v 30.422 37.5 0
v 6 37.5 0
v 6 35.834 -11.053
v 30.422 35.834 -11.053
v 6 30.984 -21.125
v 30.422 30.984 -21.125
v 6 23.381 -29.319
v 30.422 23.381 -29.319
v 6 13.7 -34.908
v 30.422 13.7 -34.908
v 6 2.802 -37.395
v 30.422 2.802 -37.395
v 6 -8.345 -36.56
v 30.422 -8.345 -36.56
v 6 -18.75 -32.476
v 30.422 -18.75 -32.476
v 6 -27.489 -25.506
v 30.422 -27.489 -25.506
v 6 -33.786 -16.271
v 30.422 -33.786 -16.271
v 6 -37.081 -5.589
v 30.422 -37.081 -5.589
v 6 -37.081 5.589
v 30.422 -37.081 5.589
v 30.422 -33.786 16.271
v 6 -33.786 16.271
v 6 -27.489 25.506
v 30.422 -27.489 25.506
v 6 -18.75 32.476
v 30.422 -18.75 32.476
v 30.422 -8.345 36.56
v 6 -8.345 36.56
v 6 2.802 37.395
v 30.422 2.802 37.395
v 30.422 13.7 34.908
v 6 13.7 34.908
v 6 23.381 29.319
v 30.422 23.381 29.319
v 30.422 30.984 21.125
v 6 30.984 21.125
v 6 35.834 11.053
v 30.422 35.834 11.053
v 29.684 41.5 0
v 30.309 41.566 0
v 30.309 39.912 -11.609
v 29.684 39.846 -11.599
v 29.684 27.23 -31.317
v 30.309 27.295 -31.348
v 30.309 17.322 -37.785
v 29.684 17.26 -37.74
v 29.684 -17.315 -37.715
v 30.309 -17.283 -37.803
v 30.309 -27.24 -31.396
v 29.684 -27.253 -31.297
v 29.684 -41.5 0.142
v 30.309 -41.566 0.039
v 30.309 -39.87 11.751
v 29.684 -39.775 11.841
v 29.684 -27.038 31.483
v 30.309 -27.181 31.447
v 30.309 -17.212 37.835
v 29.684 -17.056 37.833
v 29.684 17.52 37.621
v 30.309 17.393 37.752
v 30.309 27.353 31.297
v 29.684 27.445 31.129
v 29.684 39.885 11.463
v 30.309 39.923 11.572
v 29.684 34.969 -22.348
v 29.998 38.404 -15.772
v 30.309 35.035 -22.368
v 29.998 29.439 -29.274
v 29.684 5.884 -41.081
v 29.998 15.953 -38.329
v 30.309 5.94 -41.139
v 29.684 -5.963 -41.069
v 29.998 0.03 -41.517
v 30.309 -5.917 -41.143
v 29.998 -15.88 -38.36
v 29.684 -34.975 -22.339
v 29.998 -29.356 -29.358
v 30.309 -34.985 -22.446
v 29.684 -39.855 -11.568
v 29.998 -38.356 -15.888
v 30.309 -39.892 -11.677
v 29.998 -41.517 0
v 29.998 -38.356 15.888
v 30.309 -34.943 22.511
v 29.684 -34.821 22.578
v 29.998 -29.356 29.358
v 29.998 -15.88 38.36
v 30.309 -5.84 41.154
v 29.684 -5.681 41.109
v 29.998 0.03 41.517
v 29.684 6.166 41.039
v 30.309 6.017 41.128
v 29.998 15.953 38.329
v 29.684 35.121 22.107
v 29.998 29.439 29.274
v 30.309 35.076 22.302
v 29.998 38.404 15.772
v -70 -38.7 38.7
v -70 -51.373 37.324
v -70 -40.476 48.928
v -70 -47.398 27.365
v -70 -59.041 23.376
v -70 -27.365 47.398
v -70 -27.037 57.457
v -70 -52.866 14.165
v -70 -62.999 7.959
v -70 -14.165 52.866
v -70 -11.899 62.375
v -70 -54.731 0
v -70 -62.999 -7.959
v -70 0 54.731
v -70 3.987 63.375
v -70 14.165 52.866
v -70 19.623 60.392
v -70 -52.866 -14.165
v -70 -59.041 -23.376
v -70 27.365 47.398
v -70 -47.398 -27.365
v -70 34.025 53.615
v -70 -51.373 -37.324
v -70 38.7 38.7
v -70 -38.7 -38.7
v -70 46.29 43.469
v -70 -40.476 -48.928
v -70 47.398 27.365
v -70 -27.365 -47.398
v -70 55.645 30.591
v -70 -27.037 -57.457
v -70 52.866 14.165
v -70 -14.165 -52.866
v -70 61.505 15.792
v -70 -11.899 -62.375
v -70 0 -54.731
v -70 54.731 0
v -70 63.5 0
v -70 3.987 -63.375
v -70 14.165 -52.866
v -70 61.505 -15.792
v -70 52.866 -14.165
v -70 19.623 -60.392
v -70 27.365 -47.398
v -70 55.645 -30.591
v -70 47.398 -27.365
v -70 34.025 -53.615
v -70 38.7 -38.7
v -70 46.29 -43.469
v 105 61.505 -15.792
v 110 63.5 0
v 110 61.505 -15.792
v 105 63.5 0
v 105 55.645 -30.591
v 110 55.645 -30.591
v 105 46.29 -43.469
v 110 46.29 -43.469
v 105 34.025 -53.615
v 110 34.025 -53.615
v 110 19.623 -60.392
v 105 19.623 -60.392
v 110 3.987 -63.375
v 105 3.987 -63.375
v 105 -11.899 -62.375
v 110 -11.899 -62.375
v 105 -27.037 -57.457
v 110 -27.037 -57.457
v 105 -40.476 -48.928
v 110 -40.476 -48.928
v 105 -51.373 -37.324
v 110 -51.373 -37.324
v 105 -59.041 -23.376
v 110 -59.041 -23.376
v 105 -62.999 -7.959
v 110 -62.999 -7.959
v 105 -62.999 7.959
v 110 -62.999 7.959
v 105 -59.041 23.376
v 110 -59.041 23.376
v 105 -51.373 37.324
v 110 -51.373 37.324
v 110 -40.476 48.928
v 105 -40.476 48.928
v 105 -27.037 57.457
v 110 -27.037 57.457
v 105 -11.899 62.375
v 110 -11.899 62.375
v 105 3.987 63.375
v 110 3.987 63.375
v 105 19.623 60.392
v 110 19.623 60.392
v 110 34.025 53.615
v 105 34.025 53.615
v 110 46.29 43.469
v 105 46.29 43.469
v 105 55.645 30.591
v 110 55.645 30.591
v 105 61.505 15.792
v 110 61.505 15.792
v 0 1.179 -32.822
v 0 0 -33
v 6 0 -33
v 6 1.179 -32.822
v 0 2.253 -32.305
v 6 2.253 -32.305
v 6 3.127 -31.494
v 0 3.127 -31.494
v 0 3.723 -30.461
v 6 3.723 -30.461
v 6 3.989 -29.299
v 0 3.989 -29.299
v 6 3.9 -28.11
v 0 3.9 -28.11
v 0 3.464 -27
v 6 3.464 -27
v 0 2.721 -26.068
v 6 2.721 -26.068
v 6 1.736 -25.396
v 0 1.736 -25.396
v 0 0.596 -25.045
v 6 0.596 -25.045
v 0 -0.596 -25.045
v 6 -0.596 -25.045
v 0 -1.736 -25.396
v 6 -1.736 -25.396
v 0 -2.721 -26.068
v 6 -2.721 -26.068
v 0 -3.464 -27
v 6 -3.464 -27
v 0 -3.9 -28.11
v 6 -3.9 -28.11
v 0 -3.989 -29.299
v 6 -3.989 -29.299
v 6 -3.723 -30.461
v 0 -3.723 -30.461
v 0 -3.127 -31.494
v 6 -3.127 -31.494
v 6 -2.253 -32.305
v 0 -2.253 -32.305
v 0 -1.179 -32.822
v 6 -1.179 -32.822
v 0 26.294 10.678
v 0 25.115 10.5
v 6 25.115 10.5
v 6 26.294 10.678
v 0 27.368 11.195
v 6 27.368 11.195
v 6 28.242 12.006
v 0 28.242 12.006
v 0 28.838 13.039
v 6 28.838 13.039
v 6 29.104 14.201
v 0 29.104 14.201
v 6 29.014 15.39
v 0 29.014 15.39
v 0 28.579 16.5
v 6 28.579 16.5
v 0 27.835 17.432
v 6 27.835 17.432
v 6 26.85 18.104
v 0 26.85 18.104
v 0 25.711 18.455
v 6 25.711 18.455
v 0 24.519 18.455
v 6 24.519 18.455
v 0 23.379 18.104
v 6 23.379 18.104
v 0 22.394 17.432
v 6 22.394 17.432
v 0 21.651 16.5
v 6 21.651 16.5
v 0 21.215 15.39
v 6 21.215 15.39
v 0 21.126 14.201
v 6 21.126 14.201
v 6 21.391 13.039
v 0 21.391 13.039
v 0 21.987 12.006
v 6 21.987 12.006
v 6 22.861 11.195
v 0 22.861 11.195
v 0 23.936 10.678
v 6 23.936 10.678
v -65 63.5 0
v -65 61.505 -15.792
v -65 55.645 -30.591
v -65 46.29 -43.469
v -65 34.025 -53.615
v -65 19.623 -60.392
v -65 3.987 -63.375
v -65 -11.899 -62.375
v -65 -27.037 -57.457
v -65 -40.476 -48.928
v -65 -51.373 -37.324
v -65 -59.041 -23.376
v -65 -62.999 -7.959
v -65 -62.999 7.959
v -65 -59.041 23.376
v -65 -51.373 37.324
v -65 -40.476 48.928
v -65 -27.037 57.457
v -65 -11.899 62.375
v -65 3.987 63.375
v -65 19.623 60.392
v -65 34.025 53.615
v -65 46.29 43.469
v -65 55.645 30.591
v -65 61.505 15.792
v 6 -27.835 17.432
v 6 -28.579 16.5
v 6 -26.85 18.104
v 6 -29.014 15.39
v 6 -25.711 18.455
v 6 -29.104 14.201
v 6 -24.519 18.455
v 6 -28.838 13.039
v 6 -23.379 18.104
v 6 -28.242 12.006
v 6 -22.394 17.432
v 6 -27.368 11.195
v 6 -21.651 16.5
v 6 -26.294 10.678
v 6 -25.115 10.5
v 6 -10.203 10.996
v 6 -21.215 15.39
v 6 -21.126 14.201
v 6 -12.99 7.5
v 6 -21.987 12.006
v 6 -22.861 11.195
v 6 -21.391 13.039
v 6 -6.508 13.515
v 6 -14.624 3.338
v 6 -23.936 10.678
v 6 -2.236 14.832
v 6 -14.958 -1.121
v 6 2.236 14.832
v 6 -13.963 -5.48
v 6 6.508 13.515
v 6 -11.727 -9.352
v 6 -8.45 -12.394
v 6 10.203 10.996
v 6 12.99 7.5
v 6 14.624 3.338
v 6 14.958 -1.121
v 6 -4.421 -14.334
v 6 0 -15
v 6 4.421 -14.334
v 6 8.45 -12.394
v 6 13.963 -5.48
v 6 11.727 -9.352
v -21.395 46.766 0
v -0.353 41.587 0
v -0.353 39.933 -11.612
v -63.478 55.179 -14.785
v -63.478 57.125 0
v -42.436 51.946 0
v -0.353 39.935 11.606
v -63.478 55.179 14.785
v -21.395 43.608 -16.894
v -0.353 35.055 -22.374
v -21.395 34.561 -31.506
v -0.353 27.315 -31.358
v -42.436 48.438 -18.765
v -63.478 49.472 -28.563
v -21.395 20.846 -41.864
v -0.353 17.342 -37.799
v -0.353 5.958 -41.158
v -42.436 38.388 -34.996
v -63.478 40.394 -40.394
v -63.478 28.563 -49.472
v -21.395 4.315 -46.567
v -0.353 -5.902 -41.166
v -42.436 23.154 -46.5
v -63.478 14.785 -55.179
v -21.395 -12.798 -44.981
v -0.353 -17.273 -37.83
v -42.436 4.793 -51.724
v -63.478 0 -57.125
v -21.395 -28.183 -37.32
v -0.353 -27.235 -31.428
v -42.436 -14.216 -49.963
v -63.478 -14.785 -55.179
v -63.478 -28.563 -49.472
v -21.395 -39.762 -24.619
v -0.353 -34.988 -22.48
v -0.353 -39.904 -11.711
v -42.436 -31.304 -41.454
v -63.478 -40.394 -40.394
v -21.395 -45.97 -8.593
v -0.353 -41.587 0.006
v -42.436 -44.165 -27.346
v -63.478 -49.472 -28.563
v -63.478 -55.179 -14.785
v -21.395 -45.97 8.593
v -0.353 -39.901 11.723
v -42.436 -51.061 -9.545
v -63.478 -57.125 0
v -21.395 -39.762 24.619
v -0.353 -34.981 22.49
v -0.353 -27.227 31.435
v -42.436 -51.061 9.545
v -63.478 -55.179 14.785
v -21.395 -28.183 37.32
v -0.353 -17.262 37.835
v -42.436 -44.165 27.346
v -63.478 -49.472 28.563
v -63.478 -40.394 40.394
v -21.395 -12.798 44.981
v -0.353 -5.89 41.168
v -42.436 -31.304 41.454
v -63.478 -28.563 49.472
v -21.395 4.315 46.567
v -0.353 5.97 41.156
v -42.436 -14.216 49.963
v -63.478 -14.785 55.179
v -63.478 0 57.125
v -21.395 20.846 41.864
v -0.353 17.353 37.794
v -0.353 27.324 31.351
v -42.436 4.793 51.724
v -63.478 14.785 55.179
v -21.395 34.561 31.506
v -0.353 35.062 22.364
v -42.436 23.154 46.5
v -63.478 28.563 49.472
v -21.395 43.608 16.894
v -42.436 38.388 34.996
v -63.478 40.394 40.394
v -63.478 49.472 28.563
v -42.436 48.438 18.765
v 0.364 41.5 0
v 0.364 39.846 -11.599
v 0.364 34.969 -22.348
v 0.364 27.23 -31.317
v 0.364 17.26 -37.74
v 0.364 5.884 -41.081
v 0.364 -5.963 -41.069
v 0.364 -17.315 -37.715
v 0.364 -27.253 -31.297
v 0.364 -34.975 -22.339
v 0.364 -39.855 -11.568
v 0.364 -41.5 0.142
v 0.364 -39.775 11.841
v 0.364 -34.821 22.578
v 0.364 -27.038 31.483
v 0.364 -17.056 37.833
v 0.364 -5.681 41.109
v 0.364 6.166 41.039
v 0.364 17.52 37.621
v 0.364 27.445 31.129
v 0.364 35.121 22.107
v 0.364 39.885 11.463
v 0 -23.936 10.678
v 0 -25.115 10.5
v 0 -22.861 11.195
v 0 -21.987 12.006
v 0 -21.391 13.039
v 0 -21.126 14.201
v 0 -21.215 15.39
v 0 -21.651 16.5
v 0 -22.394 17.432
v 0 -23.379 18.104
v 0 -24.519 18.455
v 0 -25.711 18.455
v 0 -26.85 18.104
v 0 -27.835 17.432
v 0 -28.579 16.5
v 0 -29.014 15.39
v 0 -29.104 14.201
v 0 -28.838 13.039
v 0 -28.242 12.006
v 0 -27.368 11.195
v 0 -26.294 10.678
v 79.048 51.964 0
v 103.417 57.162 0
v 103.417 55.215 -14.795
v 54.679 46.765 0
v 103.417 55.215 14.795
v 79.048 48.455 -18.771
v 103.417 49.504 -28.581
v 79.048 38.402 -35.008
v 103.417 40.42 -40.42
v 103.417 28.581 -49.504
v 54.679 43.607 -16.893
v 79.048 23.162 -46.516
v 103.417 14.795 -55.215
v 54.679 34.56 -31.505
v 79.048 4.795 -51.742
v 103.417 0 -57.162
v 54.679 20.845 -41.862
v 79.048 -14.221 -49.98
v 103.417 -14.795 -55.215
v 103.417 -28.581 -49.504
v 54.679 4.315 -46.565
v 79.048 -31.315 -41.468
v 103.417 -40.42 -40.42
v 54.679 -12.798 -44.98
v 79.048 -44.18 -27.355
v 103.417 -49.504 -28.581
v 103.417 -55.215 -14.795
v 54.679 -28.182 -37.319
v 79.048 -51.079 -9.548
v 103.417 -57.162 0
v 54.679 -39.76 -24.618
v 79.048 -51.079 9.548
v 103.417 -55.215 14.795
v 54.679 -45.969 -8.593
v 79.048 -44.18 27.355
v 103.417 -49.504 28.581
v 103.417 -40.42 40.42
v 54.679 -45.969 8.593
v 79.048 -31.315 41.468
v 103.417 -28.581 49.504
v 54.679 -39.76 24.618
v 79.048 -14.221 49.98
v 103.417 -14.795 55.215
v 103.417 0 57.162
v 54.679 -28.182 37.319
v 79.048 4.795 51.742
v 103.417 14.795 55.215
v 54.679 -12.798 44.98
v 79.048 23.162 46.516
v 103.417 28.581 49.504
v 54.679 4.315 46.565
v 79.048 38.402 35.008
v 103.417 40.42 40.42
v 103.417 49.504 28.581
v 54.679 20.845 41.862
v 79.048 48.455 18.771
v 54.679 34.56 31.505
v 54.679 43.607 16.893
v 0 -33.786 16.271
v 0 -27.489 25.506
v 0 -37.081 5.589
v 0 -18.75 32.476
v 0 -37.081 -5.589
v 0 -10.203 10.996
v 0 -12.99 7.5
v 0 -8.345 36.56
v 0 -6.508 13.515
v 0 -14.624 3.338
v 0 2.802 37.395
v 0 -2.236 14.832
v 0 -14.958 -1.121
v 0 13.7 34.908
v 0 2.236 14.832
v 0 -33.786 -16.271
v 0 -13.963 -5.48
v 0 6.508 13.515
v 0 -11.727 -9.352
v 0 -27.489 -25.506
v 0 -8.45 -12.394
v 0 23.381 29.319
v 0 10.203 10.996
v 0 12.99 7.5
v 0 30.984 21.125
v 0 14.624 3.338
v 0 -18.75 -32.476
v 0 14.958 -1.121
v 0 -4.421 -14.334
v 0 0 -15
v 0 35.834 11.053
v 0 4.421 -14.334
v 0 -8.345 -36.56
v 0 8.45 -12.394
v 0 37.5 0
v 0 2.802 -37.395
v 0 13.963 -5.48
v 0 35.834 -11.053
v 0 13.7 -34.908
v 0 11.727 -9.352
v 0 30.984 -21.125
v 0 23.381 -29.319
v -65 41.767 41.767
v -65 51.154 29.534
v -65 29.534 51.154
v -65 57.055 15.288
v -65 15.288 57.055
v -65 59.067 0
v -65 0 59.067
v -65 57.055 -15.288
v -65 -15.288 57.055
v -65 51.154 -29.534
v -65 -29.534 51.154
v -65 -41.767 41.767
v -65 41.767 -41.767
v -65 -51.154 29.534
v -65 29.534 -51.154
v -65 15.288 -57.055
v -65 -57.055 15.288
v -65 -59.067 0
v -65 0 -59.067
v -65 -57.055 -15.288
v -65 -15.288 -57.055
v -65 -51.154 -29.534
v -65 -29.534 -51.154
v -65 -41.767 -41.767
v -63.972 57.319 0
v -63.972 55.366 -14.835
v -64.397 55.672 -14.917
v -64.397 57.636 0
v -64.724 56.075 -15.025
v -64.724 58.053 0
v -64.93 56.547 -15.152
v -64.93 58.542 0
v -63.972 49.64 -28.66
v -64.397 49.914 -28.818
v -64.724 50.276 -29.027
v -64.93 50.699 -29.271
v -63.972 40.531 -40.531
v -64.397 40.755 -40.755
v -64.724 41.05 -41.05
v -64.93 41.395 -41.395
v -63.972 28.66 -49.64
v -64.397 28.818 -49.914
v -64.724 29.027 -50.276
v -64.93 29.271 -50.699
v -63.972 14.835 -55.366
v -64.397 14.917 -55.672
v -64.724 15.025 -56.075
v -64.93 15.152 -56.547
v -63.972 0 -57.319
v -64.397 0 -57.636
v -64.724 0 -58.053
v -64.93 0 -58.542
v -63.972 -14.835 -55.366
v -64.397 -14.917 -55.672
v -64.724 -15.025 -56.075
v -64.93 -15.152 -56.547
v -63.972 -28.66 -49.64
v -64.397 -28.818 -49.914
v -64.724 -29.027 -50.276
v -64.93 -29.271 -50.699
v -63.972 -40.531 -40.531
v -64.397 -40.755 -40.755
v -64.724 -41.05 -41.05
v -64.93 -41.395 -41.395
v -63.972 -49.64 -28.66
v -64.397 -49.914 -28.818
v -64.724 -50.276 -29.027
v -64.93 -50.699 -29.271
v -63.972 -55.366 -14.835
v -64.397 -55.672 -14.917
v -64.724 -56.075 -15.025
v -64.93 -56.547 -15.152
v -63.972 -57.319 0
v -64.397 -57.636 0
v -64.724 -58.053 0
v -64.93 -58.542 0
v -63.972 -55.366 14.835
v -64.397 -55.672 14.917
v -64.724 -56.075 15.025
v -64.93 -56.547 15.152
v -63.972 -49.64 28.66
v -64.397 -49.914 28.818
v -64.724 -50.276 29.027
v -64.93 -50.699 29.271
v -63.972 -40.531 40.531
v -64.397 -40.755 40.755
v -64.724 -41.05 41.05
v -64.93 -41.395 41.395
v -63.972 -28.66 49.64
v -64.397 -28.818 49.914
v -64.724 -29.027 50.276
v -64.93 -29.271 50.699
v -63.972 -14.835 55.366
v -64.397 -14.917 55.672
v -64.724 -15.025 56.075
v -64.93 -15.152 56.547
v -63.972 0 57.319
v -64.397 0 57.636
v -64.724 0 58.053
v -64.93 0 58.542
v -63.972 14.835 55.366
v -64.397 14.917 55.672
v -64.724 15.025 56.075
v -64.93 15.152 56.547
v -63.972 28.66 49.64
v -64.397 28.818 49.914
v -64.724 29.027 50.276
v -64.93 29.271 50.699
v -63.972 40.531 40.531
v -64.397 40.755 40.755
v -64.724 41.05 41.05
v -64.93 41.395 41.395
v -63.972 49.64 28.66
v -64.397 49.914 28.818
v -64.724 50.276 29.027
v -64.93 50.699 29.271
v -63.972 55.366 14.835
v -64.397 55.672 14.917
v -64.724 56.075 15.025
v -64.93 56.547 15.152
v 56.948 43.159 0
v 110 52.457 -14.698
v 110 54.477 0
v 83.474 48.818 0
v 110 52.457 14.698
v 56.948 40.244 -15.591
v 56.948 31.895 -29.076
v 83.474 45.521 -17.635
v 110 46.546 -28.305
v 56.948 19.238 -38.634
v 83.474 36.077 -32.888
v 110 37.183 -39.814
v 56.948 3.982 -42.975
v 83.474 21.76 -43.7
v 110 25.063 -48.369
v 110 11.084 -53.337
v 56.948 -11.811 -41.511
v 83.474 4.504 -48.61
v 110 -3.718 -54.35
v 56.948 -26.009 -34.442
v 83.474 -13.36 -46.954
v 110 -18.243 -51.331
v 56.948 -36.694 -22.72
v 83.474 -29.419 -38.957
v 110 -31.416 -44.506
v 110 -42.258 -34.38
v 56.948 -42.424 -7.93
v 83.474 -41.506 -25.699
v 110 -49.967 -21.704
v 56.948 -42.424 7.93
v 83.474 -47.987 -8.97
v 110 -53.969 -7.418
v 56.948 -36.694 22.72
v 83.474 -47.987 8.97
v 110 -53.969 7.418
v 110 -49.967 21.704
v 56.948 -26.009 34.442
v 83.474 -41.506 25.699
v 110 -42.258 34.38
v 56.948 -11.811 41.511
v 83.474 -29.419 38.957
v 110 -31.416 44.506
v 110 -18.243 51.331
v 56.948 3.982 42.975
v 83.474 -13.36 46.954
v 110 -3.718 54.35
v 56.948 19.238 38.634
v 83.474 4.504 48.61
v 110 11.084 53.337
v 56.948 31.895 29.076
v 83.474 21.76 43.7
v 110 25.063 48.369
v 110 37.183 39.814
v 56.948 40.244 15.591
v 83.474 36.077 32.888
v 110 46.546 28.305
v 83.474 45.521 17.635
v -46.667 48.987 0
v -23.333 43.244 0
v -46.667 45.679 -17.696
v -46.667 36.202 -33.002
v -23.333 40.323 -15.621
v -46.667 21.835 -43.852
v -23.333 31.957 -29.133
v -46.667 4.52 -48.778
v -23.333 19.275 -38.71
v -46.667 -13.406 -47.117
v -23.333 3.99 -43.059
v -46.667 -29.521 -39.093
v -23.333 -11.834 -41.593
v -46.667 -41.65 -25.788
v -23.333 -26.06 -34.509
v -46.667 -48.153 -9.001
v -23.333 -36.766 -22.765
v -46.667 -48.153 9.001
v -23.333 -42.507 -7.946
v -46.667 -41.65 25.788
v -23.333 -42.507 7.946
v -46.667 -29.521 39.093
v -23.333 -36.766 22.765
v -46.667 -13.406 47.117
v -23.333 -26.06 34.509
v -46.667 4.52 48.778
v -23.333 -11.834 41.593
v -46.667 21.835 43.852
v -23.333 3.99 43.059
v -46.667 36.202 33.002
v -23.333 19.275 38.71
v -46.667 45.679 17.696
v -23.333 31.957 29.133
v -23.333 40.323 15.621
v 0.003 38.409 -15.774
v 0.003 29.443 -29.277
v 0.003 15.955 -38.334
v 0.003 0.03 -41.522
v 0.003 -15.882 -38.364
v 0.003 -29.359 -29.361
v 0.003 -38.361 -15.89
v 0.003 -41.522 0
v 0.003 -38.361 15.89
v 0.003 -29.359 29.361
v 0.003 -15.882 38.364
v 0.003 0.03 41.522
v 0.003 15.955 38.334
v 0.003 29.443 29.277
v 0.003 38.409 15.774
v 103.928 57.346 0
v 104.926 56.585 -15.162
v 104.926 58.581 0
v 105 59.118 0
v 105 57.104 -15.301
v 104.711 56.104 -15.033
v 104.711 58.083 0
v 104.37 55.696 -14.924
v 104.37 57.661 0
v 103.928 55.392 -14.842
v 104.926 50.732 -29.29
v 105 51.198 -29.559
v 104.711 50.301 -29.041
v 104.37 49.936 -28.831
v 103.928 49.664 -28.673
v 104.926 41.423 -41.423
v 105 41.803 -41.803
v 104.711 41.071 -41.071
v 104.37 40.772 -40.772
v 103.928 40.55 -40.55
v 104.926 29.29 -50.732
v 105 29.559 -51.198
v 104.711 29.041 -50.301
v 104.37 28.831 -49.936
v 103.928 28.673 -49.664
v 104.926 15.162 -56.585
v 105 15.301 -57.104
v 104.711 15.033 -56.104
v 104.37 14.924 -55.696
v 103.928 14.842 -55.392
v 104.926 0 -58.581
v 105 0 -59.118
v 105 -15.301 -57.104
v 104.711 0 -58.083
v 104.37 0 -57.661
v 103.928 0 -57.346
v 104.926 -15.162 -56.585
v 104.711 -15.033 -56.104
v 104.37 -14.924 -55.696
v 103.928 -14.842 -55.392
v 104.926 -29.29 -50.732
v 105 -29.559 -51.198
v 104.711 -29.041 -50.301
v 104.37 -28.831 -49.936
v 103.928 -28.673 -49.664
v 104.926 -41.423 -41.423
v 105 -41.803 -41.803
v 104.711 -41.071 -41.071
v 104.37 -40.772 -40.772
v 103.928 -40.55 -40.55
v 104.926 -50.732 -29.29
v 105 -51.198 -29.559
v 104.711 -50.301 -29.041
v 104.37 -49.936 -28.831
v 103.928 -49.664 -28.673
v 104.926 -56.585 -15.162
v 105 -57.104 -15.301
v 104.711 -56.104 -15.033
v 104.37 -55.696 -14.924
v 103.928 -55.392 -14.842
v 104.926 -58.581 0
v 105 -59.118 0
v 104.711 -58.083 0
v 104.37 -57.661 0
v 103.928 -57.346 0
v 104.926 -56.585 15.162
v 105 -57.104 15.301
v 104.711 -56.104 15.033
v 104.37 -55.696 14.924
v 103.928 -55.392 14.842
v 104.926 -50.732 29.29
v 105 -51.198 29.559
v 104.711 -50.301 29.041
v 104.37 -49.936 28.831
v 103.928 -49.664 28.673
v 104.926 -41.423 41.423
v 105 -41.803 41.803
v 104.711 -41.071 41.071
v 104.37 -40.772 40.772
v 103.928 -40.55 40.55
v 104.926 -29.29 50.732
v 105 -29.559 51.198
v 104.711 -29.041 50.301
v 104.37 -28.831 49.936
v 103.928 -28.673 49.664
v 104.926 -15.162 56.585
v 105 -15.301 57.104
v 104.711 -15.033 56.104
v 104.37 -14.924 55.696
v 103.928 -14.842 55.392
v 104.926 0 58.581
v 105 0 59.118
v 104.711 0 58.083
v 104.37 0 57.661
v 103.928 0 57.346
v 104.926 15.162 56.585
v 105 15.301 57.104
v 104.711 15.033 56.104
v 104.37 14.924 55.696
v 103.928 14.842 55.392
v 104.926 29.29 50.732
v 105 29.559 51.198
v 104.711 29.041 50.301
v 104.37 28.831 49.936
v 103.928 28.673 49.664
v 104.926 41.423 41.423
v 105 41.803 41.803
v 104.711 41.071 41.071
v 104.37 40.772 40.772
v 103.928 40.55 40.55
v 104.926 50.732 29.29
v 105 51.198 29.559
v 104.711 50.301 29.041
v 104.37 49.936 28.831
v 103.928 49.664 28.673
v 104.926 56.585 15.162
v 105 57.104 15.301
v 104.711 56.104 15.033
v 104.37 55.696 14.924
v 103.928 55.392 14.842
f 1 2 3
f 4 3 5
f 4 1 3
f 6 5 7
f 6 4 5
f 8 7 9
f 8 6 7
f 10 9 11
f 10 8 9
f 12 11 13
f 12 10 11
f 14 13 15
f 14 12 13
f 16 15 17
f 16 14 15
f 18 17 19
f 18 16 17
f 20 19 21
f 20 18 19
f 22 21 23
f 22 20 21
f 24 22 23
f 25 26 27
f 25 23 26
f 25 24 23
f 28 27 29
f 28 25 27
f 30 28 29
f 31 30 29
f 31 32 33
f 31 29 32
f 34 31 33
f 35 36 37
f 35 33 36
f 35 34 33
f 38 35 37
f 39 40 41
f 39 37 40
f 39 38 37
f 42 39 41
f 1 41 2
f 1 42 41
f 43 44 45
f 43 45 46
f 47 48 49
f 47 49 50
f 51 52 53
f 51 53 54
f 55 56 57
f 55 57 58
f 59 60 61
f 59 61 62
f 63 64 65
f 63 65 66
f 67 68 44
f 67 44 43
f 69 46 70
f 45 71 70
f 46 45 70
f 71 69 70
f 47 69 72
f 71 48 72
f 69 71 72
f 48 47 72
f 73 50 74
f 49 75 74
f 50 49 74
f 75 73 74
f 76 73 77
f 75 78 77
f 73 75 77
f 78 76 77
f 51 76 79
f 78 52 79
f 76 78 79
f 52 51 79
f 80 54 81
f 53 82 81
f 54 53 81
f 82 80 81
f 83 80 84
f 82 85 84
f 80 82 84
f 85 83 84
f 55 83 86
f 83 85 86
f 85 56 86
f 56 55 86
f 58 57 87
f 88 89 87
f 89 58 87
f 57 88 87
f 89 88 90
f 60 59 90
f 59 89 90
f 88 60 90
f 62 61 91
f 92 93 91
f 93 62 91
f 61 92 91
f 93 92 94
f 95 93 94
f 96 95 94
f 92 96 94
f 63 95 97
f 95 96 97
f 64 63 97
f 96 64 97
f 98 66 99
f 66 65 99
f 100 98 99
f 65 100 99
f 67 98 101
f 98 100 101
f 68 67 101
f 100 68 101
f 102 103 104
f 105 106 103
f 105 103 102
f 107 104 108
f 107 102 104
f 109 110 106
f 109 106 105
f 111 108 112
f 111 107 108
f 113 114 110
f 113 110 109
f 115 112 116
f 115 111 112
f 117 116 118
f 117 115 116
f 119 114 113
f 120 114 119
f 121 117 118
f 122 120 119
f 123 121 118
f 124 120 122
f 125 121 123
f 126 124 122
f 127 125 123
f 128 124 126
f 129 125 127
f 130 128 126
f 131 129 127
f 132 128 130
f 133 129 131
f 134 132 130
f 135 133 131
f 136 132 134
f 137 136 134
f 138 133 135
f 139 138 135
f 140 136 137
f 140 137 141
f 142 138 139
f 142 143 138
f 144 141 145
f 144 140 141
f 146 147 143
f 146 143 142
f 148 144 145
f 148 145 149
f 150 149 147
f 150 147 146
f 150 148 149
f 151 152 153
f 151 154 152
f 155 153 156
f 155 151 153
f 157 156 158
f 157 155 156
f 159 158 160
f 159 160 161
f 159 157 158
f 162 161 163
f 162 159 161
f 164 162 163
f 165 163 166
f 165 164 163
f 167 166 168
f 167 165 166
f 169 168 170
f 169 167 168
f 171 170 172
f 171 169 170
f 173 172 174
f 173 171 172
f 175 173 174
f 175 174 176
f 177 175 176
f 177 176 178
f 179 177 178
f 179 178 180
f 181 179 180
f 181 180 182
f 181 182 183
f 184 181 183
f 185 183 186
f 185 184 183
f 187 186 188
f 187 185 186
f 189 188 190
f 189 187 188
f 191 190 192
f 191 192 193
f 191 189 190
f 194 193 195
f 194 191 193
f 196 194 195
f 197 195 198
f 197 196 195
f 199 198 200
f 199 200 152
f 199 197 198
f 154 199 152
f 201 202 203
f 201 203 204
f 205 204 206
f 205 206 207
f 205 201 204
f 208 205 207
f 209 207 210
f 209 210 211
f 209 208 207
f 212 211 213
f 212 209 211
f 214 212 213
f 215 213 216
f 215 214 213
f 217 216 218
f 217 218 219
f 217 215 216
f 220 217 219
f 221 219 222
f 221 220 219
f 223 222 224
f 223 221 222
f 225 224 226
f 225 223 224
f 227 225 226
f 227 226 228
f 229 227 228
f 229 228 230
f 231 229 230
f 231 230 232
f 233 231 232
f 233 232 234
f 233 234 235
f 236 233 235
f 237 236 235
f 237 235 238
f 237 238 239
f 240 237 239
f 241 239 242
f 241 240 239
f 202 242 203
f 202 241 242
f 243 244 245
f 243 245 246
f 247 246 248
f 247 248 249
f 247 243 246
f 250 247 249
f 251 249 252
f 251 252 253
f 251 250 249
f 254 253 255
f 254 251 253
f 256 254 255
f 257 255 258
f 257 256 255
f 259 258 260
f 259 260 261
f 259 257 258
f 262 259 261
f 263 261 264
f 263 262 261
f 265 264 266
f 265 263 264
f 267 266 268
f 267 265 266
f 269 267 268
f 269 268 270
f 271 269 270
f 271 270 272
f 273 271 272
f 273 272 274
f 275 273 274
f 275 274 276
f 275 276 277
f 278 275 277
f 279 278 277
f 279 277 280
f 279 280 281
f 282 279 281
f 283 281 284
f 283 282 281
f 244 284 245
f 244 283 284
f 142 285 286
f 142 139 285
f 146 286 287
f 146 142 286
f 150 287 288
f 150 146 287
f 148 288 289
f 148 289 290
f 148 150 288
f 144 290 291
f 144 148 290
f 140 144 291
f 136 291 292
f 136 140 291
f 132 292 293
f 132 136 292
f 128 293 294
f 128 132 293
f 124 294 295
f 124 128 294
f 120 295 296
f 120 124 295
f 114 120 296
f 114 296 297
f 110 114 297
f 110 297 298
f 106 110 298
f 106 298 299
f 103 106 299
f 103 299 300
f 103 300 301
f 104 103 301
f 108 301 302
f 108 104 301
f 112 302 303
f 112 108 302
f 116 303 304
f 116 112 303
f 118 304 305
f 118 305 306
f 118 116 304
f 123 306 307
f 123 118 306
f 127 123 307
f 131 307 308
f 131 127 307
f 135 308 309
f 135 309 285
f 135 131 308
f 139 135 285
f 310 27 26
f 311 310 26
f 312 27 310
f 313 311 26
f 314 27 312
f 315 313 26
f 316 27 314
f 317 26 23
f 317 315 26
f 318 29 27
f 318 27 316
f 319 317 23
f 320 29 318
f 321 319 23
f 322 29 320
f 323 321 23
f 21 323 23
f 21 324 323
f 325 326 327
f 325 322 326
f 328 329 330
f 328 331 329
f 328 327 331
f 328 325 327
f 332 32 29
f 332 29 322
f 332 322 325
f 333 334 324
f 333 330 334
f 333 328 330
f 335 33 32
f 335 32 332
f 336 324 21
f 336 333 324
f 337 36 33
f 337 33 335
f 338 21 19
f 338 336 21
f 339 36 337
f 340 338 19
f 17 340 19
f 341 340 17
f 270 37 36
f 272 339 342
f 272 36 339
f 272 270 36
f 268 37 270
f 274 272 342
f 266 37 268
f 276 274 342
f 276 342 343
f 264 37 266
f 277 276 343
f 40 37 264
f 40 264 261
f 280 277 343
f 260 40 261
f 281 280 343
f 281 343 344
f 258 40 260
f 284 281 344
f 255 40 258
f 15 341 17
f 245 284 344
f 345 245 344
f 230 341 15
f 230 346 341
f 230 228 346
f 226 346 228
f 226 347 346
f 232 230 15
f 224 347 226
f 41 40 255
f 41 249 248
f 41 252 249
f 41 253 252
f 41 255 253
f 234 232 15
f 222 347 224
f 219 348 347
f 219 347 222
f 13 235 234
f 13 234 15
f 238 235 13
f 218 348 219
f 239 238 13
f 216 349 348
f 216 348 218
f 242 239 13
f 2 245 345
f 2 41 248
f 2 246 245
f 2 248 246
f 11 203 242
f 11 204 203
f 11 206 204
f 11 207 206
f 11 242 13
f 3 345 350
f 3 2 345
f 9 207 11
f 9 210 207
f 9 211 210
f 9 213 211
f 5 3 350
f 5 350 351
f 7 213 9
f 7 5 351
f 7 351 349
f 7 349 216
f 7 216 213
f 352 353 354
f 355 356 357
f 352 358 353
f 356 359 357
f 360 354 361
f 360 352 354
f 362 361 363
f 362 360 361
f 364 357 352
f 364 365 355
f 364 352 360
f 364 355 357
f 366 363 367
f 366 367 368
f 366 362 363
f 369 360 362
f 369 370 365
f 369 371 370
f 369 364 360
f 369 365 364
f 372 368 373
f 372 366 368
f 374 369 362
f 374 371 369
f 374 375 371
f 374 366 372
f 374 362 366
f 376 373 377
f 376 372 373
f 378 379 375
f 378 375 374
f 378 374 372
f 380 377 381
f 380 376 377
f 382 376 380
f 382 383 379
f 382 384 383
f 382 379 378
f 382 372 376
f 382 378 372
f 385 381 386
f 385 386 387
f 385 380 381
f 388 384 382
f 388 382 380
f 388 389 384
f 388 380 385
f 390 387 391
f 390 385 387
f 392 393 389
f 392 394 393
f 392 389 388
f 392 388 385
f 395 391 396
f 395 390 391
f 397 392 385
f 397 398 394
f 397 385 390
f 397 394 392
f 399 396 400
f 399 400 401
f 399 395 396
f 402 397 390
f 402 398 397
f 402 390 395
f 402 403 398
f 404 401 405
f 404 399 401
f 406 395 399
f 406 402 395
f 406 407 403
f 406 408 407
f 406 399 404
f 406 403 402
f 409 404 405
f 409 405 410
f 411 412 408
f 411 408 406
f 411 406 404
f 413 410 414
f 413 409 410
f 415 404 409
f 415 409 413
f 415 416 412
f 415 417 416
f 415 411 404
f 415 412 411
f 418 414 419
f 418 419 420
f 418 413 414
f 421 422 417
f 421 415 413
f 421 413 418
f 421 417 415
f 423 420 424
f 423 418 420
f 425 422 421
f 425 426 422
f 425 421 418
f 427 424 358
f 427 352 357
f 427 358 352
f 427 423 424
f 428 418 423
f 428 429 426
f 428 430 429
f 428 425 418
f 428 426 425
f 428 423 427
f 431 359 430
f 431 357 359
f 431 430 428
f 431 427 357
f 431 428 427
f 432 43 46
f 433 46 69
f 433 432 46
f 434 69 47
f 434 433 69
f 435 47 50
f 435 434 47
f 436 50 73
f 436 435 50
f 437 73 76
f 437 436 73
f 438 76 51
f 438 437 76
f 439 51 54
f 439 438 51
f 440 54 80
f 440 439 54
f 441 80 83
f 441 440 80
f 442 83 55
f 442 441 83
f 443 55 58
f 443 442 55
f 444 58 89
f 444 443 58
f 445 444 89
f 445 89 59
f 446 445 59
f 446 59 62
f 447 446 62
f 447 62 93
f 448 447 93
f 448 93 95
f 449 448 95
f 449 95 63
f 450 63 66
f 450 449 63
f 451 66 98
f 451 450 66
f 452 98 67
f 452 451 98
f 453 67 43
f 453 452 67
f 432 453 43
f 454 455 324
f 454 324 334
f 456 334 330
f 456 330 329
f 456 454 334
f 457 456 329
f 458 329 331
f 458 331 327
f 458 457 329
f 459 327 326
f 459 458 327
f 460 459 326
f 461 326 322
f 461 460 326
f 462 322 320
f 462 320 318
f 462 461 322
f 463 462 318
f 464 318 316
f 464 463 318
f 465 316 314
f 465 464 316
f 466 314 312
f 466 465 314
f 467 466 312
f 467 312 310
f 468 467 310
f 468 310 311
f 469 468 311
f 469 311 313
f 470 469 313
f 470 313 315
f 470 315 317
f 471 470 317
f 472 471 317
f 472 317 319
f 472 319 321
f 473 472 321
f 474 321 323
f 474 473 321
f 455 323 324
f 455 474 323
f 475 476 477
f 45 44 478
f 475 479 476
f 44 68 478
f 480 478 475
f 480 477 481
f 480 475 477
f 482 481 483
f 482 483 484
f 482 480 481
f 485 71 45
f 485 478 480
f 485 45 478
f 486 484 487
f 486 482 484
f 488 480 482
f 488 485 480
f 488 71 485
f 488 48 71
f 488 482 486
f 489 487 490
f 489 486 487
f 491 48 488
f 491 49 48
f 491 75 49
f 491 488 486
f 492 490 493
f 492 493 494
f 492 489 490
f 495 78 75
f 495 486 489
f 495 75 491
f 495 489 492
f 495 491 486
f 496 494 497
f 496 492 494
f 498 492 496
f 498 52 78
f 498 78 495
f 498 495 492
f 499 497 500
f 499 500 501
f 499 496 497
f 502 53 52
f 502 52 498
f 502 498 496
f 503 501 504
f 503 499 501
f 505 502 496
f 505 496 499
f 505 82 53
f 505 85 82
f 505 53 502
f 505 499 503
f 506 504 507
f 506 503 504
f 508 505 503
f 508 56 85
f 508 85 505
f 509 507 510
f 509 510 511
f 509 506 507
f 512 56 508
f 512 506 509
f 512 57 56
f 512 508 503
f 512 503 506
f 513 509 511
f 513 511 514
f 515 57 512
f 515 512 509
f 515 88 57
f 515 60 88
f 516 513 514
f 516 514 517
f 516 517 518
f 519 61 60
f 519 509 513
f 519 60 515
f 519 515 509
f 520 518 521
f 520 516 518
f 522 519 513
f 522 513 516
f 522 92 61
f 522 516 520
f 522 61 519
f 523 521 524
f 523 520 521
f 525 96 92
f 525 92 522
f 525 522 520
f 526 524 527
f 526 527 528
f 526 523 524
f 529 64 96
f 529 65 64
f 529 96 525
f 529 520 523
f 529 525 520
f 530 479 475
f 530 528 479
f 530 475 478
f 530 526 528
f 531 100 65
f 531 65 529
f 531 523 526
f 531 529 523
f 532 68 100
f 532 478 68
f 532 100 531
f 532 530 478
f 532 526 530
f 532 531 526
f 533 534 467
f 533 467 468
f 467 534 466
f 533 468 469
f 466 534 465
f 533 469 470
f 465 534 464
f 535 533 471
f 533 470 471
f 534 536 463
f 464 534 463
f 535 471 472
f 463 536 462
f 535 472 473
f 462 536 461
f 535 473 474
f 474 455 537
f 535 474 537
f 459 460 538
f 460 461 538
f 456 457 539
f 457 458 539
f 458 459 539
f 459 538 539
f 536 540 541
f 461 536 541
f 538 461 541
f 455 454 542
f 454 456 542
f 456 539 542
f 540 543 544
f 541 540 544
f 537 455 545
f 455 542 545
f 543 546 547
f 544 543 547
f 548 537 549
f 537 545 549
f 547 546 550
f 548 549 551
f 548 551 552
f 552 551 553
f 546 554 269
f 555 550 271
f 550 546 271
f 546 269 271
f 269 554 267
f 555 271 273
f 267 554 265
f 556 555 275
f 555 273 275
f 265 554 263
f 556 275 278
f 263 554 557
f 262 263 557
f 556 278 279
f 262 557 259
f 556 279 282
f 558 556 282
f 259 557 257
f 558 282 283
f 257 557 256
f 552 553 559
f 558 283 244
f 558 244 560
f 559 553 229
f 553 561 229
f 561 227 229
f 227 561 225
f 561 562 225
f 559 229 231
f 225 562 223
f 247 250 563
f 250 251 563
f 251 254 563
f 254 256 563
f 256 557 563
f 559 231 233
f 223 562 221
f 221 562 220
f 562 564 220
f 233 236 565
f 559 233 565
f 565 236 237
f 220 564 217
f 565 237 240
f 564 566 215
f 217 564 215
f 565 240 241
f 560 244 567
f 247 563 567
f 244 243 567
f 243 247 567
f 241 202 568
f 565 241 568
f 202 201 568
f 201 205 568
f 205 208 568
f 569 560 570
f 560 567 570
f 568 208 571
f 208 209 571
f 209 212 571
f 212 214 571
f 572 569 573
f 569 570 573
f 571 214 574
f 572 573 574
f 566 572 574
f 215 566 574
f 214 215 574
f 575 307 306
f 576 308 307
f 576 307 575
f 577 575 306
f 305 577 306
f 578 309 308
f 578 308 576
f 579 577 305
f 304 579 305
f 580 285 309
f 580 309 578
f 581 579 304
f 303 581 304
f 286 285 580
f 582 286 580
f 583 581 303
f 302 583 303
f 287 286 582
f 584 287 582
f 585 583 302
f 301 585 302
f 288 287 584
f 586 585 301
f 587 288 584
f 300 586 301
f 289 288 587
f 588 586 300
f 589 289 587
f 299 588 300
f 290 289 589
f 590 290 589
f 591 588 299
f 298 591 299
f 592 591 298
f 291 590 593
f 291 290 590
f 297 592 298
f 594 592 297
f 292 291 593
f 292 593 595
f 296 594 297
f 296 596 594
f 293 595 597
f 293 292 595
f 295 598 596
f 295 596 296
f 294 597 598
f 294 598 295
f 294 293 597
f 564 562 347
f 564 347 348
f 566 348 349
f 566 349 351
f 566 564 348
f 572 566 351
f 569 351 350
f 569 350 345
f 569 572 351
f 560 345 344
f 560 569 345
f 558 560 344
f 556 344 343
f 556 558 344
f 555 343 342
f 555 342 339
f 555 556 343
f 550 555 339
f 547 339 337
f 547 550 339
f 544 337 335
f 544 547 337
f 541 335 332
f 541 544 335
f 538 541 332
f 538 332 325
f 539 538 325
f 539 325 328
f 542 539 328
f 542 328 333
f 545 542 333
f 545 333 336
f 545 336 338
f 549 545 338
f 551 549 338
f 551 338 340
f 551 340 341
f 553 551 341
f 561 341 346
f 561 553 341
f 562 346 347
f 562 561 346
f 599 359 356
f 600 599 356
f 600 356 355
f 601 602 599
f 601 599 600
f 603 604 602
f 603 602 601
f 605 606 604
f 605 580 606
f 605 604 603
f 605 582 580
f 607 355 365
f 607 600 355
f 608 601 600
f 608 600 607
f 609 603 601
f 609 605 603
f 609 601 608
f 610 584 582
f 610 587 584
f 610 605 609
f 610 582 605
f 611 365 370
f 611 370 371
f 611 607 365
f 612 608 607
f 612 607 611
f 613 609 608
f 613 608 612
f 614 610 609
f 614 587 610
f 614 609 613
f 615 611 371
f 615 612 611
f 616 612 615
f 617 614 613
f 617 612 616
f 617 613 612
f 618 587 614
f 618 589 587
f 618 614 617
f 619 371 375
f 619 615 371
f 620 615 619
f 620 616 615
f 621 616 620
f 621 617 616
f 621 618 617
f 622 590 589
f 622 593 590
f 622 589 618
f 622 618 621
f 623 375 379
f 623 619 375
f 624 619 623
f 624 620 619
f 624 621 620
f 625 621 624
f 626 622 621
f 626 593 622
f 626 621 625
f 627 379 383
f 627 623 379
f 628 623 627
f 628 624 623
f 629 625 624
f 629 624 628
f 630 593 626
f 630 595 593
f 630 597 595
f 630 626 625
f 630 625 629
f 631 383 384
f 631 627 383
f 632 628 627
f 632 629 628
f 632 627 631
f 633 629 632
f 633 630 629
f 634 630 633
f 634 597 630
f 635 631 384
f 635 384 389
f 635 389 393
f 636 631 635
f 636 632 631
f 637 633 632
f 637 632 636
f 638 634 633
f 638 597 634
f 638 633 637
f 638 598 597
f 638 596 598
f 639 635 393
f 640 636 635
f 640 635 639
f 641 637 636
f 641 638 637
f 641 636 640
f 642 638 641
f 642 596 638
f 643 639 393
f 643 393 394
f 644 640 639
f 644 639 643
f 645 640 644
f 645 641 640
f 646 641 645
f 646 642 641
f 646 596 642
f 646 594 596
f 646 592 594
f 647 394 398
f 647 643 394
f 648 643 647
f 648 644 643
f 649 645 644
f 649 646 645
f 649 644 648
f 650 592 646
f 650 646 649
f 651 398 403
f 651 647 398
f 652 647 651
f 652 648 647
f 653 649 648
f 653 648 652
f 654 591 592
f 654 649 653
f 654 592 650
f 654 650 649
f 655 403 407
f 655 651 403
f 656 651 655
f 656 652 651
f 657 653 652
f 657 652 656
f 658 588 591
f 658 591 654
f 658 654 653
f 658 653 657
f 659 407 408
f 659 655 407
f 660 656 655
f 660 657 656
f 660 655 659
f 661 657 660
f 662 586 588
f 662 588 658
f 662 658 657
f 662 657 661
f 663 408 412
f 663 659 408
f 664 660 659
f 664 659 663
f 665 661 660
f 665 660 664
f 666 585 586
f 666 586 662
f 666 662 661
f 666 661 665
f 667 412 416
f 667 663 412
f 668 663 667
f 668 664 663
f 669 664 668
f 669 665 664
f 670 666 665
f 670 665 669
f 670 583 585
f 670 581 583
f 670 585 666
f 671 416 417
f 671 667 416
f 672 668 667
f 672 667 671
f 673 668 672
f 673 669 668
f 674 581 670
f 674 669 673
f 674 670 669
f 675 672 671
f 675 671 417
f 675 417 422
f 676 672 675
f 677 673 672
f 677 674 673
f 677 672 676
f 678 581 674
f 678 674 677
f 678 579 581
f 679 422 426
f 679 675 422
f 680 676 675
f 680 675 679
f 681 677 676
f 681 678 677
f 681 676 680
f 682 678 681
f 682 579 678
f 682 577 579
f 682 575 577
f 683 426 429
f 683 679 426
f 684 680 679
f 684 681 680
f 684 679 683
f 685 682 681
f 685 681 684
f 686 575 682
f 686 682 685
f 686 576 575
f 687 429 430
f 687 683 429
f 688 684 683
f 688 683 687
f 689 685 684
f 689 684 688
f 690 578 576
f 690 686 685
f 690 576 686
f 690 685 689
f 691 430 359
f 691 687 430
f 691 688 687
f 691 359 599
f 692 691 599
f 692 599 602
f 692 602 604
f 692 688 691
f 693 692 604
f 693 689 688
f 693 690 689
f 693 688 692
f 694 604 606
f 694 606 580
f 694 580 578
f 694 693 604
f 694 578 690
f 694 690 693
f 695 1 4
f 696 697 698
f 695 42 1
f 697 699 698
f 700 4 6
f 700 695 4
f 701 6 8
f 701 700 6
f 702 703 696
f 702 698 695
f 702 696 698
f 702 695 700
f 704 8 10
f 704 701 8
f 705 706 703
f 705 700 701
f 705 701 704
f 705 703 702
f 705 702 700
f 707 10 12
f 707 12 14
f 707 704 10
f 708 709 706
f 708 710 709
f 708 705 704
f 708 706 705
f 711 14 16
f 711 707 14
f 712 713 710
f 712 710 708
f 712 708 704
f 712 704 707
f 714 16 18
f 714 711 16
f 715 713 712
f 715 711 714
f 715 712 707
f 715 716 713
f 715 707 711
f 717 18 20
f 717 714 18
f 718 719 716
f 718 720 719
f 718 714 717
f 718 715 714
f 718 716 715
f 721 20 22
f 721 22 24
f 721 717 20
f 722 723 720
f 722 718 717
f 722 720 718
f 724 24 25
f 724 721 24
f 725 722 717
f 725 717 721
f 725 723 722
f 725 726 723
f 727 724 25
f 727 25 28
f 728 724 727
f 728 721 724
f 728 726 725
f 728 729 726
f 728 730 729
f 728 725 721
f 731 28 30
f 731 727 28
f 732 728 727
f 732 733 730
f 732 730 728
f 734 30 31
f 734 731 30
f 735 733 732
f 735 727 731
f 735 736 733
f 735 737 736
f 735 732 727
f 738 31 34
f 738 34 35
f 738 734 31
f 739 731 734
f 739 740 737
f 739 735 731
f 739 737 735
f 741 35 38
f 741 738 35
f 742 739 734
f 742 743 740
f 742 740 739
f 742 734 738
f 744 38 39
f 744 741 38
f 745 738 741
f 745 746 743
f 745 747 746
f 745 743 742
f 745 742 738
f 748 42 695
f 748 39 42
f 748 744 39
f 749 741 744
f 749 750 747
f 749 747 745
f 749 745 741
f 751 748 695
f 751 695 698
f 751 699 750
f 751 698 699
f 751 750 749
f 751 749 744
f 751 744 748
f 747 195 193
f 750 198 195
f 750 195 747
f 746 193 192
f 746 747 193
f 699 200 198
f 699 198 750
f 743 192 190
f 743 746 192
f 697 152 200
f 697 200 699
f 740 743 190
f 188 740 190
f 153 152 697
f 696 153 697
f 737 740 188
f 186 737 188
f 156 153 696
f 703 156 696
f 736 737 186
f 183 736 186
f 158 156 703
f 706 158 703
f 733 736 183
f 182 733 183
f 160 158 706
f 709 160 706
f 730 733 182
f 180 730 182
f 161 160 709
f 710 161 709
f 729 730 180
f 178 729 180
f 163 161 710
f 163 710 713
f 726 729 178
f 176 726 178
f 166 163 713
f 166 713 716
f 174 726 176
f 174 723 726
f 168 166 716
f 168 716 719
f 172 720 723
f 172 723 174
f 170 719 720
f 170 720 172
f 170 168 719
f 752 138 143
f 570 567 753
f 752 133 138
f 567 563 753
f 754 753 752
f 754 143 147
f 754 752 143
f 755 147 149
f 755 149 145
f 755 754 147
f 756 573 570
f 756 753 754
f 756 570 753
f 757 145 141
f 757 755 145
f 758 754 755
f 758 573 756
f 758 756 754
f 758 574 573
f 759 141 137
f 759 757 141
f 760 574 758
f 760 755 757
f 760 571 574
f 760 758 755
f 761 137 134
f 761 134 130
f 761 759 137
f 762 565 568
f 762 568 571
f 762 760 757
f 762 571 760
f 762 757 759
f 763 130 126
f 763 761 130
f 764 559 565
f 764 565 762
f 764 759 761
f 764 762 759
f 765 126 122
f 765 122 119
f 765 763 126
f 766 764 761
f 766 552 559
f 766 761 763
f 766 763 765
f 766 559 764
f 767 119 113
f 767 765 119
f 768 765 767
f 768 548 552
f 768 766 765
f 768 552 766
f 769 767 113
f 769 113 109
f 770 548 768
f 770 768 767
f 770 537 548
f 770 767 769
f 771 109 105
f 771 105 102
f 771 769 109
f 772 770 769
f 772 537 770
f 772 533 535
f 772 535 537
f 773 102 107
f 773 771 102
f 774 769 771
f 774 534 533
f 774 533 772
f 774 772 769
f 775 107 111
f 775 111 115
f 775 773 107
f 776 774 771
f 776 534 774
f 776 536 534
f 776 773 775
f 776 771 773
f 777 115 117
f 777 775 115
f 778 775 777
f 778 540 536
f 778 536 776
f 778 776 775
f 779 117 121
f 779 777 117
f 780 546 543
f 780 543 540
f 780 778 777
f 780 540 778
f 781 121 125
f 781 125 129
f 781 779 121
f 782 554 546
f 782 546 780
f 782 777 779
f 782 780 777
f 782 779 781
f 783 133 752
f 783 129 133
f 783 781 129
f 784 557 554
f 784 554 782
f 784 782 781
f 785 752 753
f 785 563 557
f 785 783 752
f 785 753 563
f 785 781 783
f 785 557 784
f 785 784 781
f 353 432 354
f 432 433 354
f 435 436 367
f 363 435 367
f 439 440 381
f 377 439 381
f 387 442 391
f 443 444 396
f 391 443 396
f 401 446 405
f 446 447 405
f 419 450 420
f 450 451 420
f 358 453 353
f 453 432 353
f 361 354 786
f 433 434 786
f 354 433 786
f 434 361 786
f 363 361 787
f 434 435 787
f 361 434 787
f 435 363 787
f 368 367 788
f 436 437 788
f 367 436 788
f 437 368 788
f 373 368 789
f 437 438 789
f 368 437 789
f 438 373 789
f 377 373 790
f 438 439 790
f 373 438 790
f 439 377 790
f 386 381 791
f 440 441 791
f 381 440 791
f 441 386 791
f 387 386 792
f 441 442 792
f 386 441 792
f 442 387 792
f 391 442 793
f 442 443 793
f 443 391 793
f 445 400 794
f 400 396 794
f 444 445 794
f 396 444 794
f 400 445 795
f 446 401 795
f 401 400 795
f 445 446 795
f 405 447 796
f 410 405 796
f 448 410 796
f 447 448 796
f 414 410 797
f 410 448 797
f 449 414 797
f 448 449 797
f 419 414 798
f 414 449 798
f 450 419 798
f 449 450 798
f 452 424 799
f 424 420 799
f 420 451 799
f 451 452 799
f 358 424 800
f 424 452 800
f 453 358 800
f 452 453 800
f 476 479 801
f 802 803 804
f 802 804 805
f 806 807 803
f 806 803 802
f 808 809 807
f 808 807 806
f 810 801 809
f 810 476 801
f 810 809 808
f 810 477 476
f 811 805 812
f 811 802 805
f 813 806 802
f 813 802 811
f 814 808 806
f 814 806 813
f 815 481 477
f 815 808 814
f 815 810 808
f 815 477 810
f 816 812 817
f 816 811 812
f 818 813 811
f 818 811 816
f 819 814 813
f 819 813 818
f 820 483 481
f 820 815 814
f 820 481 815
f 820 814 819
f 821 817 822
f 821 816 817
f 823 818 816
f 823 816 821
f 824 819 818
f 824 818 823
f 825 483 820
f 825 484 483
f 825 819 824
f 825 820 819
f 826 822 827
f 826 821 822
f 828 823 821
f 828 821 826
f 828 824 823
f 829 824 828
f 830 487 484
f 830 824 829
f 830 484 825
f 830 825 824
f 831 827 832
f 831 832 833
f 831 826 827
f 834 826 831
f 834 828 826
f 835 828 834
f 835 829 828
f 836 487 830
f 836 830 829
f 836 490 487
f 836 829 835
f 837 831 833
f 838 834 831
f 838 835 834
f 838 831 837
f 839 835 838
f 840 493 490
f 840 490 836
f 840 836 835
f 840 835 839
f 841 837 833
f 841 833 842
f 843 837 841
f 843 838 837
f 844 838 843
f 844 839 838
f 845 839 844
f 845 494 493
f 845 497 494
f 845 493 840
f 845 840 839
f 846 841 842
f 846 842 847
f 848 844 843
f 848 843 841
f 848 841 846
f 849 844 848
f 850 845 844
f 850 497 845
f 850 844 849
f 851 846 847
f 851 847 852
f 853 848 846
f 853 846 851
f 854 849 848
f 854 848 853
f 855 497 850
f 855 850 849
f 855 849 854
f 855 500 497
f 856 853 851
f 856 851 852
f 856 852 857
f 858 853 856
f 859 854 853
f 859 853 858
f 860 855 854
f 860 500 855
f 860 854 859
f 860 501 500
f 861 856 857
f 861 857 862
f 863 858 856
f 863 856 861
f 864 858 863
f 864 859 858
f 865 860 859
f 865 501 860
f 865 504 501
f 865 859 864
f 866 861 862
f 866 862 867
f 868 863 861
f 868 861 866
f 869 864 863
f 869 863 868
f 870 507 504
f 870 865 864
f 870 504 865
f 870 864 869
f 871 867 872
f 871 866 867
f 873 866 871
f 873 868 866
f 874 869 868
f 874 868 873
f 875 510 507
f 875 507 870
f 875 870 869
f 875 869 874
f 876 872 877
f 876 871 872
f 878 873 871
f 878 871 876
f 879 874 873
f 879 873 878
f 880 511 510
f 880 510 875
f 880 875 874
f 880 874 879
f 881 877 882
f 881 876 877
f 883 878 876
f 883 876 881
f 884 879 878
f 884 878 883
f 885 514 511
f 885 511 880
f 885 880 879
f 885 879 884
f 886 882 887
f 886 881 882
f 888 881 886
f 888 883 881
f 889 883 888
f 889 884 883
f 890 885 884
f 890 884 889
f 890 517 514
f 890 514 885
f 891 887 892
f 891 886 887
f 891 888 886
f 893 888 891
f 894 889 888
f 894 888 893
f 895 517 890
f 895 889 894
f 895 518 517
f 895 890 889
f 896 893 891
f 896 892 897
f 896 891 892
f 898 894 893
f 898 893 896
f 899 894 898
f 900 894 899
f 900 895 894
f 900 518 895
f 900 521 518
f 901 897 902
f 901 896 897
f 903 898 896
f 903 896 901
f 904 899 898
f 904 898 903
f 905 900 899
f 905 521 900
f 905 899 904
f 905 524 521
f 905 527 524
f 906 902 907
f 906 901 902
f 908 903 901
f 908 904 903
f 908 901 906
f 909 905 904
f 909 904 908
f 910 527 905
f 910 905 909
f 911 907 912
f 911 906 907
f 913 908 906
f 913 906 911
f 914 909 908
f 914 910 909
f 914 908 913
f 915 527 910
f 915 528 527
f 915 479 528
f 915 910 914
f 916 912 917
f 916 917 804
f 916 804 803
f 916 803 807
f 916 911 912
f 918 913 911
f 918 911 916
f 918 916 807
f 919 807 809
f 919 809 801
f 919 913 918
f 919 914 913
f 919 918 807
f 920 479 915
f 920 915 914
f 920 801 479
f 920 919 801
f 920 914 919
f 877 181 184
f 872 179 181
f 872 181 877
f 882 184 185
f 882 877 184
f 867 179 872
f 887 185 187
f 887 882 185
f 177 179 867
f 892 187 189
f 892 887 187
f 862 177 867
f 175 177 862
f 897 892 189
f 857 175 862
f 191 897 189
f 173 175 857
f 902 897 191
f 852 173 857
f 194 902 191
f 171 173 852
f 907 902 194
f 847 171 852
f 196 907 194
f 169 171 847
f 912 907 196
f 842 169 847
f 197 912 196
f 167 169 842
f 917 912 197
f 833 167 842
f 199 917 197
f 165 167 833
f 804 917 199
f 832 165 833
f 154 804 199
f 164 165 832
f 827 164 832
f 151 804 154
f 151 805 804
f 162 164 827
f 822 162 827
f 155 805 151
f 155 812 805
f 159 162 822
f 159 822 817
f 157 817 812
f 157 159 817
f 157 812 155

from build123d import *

# Parameters (mm, degrees)
SKETCH1_R           = 37.5
SKETCH1_R_2         = 4
SKETCH1_R_3         = 15
BOSS_EXTRUDE1_DEPTH = 6
FILLET1_R           = 2
FILLET2_R           = 3


with BuildPart() as part:
    # Sketch1 → Boss-Extrude1 (new body)
    with BuildSketch(Plane(origin=(0, 0, 0), x_dir=(0, 0, -1), z_dir=(1, 0, 0))):
        Circle(SKETCH1_R)
        with Locations((29, 0)):
            Circle(SKETCH1_R_2, mode=Mode.SUBTRACT)
        with Locations((-14.5, -25.11473671)):
            Circle(SKETCH1_R_2, mode=Mode.SUBTRACT)
        with Locations((-14.5, 25.11473671)):
            Circle(SKETCH1_R_2, mode=Mode.SUBTRACT)
        Circle(SKETCH1_R_3, mode=Mode.SUBTRACT)
    extrude(amount=BOSS_EXTRUDE1_DEPTH)

    # Sketch2 → Revolve1 (revolve)
    with BuildSketch(Plane.XY):
        Polygon((-65, 63.5), (-70, 63.5), (-70, 54.730769231), (0, 37.5), (30.42191957, 37.5), (110, 54.476657158), (110, 63.5), (105, 63.5), (105, 57.5), (30, 41.5), (0, 41.5), (-65, 57.5), align=None)
    revolve(axis=Axis((0, 0, 0), (-1, 0, 0)))

    # Fillet1
    fillet1_edges = [part.edges().sort_by_distance(p)[0] for p in [
        (105, -57.5, 0),
        (-65, -57.5, 0),
    ]]
    fillet(fillet1_edges, radius=FILLET1_R)

    # Fillet2
    fillet2_edges = [part.edges().sort_by_distance(p)[0] for p in [
        (30, -41.5, 0),
        (0, -41.5, 0),
    ]]
    fillet(fillet2_edges, radius=FILLET2_R)


solid = part.part
